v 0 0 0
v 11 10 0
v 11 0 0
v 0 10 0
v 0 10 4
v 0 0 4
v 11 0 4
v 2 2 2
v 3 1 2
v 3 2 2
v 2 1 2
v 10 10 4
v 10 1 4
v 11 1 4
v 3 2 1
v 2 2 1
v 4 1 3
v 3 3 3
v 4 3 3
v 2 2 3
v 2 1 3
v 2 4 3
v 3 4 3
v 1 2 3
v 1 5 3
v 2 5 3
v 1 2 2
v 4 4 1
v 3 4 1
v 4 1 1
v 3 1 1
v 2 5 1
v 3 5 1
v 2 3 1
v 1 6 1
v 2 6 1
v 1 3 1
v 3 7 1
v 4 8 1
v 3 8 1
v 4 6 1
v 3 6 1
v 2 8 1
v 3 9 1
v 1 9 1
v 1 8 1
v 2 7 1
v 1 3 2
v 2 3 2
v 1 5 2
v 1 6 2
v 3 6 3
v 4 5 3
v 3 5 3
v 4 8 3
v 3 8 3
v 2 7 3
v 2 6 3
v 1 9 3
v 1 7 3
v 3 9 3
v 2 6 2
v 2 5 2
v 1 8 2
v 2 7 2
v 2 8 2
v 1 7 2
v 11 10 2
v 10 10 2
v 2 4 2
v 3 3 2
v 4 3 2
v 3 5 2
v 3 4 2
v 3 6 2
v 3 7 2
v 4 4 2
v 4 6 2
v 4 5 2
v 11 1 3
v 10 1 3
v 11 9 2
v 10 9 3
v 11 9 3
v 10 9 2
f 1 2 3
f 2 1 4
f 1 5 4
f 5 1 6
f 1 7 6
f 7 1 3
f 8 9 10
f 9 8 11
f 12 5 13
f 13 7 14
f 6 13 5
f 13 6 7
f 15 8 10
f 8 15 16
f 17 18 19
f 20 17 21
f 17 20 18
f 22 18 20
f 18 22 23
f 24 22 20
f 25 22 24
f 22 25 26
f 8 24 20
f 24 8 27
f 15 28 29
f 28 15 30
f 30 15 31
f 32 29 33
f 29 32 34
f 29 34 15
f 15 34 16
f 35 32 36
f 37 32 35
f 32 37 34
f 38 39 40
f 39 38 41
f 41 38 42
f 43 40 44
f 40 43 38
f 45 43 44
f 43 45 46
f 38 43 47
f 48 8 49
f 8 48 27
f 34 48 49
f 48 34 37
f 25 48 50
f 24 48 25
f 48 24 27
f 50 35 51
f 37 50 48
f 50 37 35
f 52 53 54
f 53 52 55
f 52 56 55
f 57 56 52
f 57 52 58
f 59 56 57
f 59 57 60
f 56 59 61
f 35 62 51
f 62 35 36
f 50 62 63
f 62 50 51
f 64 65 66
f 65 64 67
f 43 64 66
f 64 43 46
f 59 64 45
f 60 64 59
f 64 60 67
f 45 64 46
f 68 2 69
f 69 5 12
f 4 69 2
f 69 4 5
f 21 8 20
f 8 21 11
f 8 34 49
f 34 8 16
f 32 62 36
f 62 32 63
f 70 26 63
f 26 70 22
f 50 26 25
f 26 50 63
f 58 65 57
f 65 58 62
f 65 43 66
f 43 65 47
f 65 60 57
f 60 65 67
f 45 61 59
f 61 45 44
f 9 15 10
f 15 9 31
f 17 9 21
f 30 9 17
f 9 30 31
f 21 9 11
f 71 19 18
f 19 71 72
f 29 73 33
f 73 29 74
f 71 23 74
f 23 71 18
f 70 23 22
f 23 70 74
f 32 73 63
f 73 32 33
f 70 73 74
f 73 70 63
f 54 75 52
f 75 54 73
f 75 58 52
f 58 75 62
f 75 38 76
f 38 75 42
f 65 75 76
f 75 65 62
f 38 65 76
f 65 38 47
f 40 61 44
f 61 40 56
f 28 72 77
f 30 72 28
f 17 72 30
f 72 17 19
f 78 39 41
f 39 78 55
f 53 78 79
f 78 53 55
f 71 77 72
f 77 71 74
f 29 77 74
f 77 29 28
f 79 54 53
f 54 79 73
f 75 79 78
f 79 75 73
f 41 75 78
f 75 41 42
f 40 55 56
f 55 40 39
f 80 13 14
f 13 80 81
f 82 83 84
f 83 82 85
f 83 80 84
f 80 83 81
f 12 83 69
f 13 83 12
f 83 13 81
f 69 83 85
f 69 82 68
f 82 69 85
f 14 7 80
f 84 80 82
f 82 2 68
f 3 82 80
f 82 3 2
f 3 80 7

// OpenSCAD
union() {
    translate([0, 0, 0]) cube([1, 1, 1]);
    translate([0, 0, 1]) cube([1, 1, 1]);
    translate([0, 0, 2]) cube([1, 1, 1]);
    translate([0, 0, 3]) cube([1, 1, 1]);
    translate([0, 1, 0]) cube([1, 1, 1]);
    translate([0, 1, 1]) cube([1, 1, 1]);
    translate([0, 1, 2]) cube([1, 1, 1]);
    translate([0, 1, 3]) cube([1, 1, 1]);
    translate([0, 2, 0]) cube([1, 1, 1]);
    translate([0, 2, 1]) cube([1, 1, 1]);
    translate([0, 2, 2]) cube([1, 1, 1]);
    translate([0, 2, 3]) cube([1, 1, 1]);
    translate([0, 3, 0]) cube([1, 1, 1]);
    translate([0, 3, 1]) cube([1, 1, 1]);
    translate([0, 3, 2]) cube([1, 1, 1]);
    translate([0, 3, 3]) cube([1, 1, 1]);
    translate([0, 4, 0]) cube([1, 1, 1]);
    translate([0, 4, 1]) cube([1, 1, 1]);
    translate([0, 4, 2]) cube([1, 1, 1]);
    translate([0, 4, 3]) cube([1, 1, 1]);
    translate([0, 5, 0]) cube([1, 1, 1]);
    translate([0, 5, 1]) cube([1, 1, 1]);
    translate([0, 5, 2]) cube([1, 1, 1]);
    translate([0, 5, 3]) cube([1, 1, 1]);
    translate([0, 6, 0]) cube([1, 1, 1]);
    translate([0, 6, 1]) cube([1, 1, 1]);
    translate([0, 6, 2]) cube([1, 1, 1]);
    translate([0, 6, 3]) cube([1, 1, 1]);
    translate([0, 7, 0]) cube([1, 1, 1]);
    translate([0, 7, 1]) cube([1, 1, 1]);
    translate([0, 7, 2]) cube([1, 1, 1]);
    translate([0, 7, 3]) cube([1, 1, 1]);
    translate([0, 8, 0]) cube([1, 1, 1]);
    translate([0, 8, 1]) cube([1, 1, 1]);
    translate([0, 8, 2]) cube([1, 1, 1]);
    translate([0, 8, 3]) cube([1, 1, 1]);
    translate([0, 9, 0]) cube([1, 1, 1]);
    translate([0, 9, 1]) cube([1, 1, 1]);
    translate([0, 9, 2]) cube([1, 1, 1]);
    translate([0, 9, 3]) cube([1, 1, 1]);
    translate([1, 0, 0]) cube([1, 1, 1]);
    translate([1, 0, 1]) cube([1, 1, 1]);
    translate([1, 0, 2]) cube([1, 1, 1]);
    translate([1, 0, 3]) cube([1, 1, 1]);
    translate([1, 1, 0]) cube([1, 1, 1]);
    translate([1, 1, 1]) cube([1, 1, 1]);
    translate([1, 1, 2]) cube([1, 1, 1]);
    translate([1, 1, 3]) cube([1, 1, 1]);
    translate([1, 2, 0]) cube([1, 1, 1]);
    translate([1, 2, 1]) cube([1, 1, 1]);
    translate([1, 2, 3]) cube([1, 1, 1]);
    translate([1, 3, 0]) cube([1, 1, 1]);
    translate([1, 3, 3]) cube([1, 1, 1]);
    translate([1, 4, 0]) cube([1, 1, 1]);
    translate([1, 4, 3]) cube([1, 1, 1]);
    translate([1, 5, 0]) cube([1, 1, 1]);
    translate([1, 5, 2]) cube([1, 1, 1]);
    translate([1, 5, 3]) cube([1, 1, 1]);
    translate([1, 6, 0]) cube([1, 1, 1]);
    translate([1, 6, 1]) cube([1, 1, 1]);
    translate([1, 6, 2]) cube([1, 1, 1]);
    translate([1, 6, 3]) cube([1, 1, 1]);
    translate([1, 7, 0]) cube([1, 1, 1]);
    translate([1, 7, 1]) cube([1, 1, 1]);
    translate([1, 7, 3]) cube([1, 1, 1]);
    translate([1, 8, 0]) cube([1, 1, 1]);
    translate([1, 8, 3]) cube([1, 1, 1]);
    translate([1, 9, 0]) cube([1, 1, 1]);
    translate([1, 9, 1]) cube([1, 1, 1]);
    translate([1, 9, 2]) cube([1, 1, 1]);
    translate([1, 9, 3]) cube([1, 1, 1]);
    translate([2, 0, 0]) cube([1, 1, 1]);
    translate([2, 0, 1]) cube([1, 1, 1]);
    translate([2, 0, 2]) cube([1, 1, 1]);
    translate([2, 0, 3]) cube([1, 1, 1]);
    translate([2, 1, 0]) cube([1, 1, 1]);
    translate([2, 1, 1]) cube([1, 1, 1]);
    translate([2, 1, 3]) cube([1, 1, 1]);
    translate([2, 2, 0]) cube([1, 1, 1]);
    translate([2, 2, 3]) cube([1, 1, 1]);
    translate([2, 3, 0]) cube([1, 1, 1]);
    translate([2, 3, 3]) cube([1, 1, 1]);
    translate([2, 4, 0]) cube([1, 1, 1]);
    translate([2, 4, 2]) cube([1, 1, 1]);
    translate([2, 4, 3]) cube([1, 1, 1]);
    translate([2, 5, 0]) cube([1, 1, 1]);
    translate([2, 5, 1]) cube([1, 1, 1]);
    translate([2, 5, 2]) cube([1, 1, 1]);
    translate([2, 5, 3]) cube([1, 1, 1]);
    translate([2, 6, 0]) cube([1, 1, 1]);
    translate([2, 6, 1]) cube([1, 1, 1]);
    translate([2, 6, 3]) cube([1, 1, 1]);
    translate([2, 7, 0]) cube([1, 1, 1]);
    translate([2, 7, 3]) cube([1, 1, 1]);
    translate([2, 8, 0]) cube([1, 1, 1]);
    translate([2, 8, 3]) cube([1, 1, 1]);
    translate([2, 9, 0]) cube([1, 1, 1]);
    translate([2, 9, 1]) cube([1, 1, 1]);
    translate([2, 9, 2]) cube([1, 1, 1]);
    translate([2, 9, 3]) cube([1, 1, 1]);
    translate([3, 0, 0]) cube([1, 1, 1]);
    translate([3, 0, 1]) cube([1, 1, 1]);
    translate([3, 0, 2]) cube([1, 1, 1]);
    translate([3, 0, 3]) cube([1, 1, 1]);
    translate([3, 1, 0]) cube([1, 1, 1]);
    translate([3, 1, 3]) cube([1, 1, 1]);
    translate([3, 2, 0]) cube([1, 1, 1]);
    translate([3, 2, 3]) cube([1, 1, 1]);
    translate([3, 3, 0]) cube([1, 1, 1]);
    translate([3, 3, 2]) cube([1, 1, 1]);
    translate([3, 3, 3]) cube([1, 1, 1]);
    translate([3, 4, 0]) cube([1, 1, 1]);
    translate([3, 4, 1]) cube([1, 1, 1]);
    translate([3, 4, 2]) cube([1, 1, 1]);
    translate([3, 4, 3]) cube([1, 1, 1]);
    translate([3, 5, 0]) cube([1, 1, 1]);
    translate([3, 5, 1]) cube([1, 1, 1]);
    translate([3, 5, 3]) cube([1, 1, 1]);
    translate([3, 6, 0]) cube([1, 1, 1]);
    translate([3, 6, 3]) cube([1, 1, 1]);
    translate([3, 7, 0]) cube([1, 1, 1]);
    translate([3, 7, 3]) cube([1, 1, 1]);
    translate([3, 8, 0]) cube([1, 1, 1]);
    translate([3, 8, 1]) cube([1, 1, 1]);
    translate([3, 8, 2]) cube([1, 1, 1]);
    translate([3, 8, 3]) cube([1, 1, 1]);
    translate([3, 9, 0]) cube([1, 1, 1]);
    translate([3, 9, 1]) cube([1, 1, 1]);
    translate([3, 9, 2]) cube([1, 1, 1]);
    translate([3, 9, 3]) cube([1, 1, 1]);
    translate([4, 0, 0]) cube([1, 1, 1]);
    translate([4, 0, 1]) cube([1, 1, 1]);
    translate([4, 0, 2]) cube([1, 1, 1]);
    translate([4, 0, 3]) cube([1, 1, 1]);
    translate([4, 1, 0]) cube([1, 1, 1]);
    translate([4, 1, 1]) cube([1, 1, 1]);
    translate([4, 1, 2]) cube([1, 1, 1]);
    translate([4, 1, 3]) cube([1, 1, 1]);
    translate([4, 2, 0]) cube([1, 1, 1]);
    translate([4, 2, 1]) cube([1, 1, 1]);
    translate([4, 2, 2]) cube([1, 1, 1]);
    translate([4, 2, 3]) cube([1, 1, 1]);
    translate([4, 3, 0]) cube([1, 1, 1]);
    translate([4, 3, 1]) cube([1, 1, 1]);
    translate([4, 3, 2]) cube([1, 1, 1]);
    translate([4, 3, 3]) cube([1, 1, 1]);
    translate([4, 4, 0]) cube([1, 1, 1]);
    translate([4, 4, 1]) cube([1, 1, 1]);
    translate([4, 4, 2]) cube([1, 1, 1]);
    translate([4, 4, 3]) cube([1, 1, 1]);
    translate([4, 5, 0]) cube([1, 1, 1]);
    translate([4, 5, 1]) cube([1, 1, 1]);
    translate([4, 5, 2]) cube([1, 1, 1]);
    translate([4, 5, 3]) cube([1, 1, 1]);
    translate([4, 6, 0]) cube([1, 1, 1]);
    translate([4, 6, 1]) cube([1, 1, 1]);
    translate([4, 6, 2]) cube([1, 1, 1]);
    translate([4, 6, 3]) cube([1, 1, 1]);
    translate([4, 7, 0]) cube([1, 1, 1]);
    translate([4, 7, 1]) cube([1, 1, 1]);
    translate([4, 7, 2]) cube([1, 1, 1]);
    translate([4, 7, 3]) cube([1, 1, 1]);
    translate([4, 8, 0]) cube([1, 1, 1]);
    translate([4, 8, 1]) cube([1, 1, 1]);
    translate([4, 8, 2]) cube([1, 1, 1]);
    translate([4, 8, 3]) cube([1, 1, 1]);
    translate([4, 9, 0]) cube([1, 1, 1]);
    translate([4, 9, 1]) cube([1, 1, 1]);
    translate([4, 9, 2]) cube([1, 1, 1]);
    translate([4, 9, 3]) cube([1, 1, 1]);
    translate([5, 0, 0]) cube([1, 1, 1]);
    translate([5, 0, 1]) cube([1, 1, 1]);
    translate([5, 0, 2]) cube([1, 1, 1]);
    translate([5, 0, 3]) cube([1, 1, 1]);
    translate([5, 1, 0]) cube([1, 1, 1]);
    translate([5, 1, 1]) cube([1, 1, 1]);
    translate([5, 1, 2]) cube([1, 1, 1]);
    translate([5, 1, 3]) cube([1, 1, 1]);
    translate([5, 2, 0]) cube([1, 1, 1]);
    translate([5, 2, 1]) cube([1, 1, 1]);
    translate([5, 2, 2]) cube([1, 1, 1]);
    translate([5, 2, 3]) cube([1, 1, 1]);
    translate([5, 3, 0]) cube([1, 1, 1]);
    translate([5, 3, 1]) cube([1, 1, 1]);
    translate([5, 3, 2]) cube([1, 1, 1]);
    translate([5, 3, 3]) cube([1, 1, 1]);
    translate([5, 4, 0]) cube([1, 1, 1]);
    translate([5, 4, 1]) cube([1, 1, 1]);
    translate([5, 4, 2]) cube([1, 1, 1]);
    translate([5, 4, 3]) cube([1, 1, 1]);
    translate([5, 5, 0]) cube([1, 1, 1]);
    translate([5, 5, 1]) cube([1, 1, 1]);
    translate([5, 5, 2]) cube([1, 1, 1]);
    translate([5, 5, 3]) cube([1, 1, 1]);
    translate([5, 6, 0]) cube([1, 1, 1]);
    translate([5, 6, 1]) cube([1, 1, 1]);
    translate([5, 6, 2]) cube([1, 1, 1]);
    translate([5, 6, 3]) cube([1, 1, 1]);
    translate([5, 7, 0]) cube([1, 1, 1]);
    translate([5, 7, 1]) cube([1, 1, 1]);
    translate([5, 7, 2]) cube([1, 1, 1]);
    translate([5, 7, 3]) cube([1, 1, 1]);
    translate([5, 8, 0]) cube([1, 1, 1]);
    translate([5, 8, 1]) cube([1, 1, 1]);
    translate([5, 8, 2]) cube([1, 1, 1]);
    translate([5, 8, 3]) cube([1, 1, 1]);
    translate([5, 9, 0]) cube([1, 1, 1]);
    translate([5, 9, 1]) cube([1, 1, 1]);
    translate([5, 9, 2]) cube([1, 1, 1]);
    translate([5, 9, 3]) cube([1, 1, 1]);
    translate([6, 0, 0]) cube([1, 1, 1]);
    translate([6, 0, 1]) cube([1, 1, 1]);
    translate([6, 0, 2]) cube([1, 1, 1]);
    translate([6, 0, 3]) cube([1, 1, 1]);
    translate([6, 1, 0]) cube([1, 1, 1]);
    translate([6, 1, 1]) cube([1, 1, 1]);
    translate([6, 1, 2]) cube([1, 1, 1]);
    translate([6, 1, 3]) cube([1, 1, 1]);
    translate([6, 2, 0]) cube([1, 1, 1]);
    translate([6, 2, 1]) cube([1, 1, 1]);
    translate([6, 2, 2]) cube([1, 1, 1]);
    translate([6, 2, 3]) cube([1, 1, 1]);
    translate([6, 3, 0]) cube([1, 1, 1]);
    translate([6, 3, 1]) cube([1, 1, 1]);
    translate([6, 3, 2]) cube([1, 1, 1]);
    translate([6, 3, 3]) cube([1, 1, 1]);
    translate([6, 4, 0]) cube([1, 1, 1]);
    translate([6, 4, 1]) cube([1, 1, 1]);
    translate([6, 4, 2]) cube([1, 1, 1]);
    translate([6, 4, 3]) cube([1, 1, 1]);
    translate([6, 5, 0]) cube([1, 1, 1]);
    translate([6, 5, 1]) cube([1, 1, 1]);
    translate([6, 5, 2]) cube([1, 1, 1]);
    translate([6, 5, 3]) cube([1, 1, 1]);
    translate([6, 6, 0]) cube([1, 1, 1]);
    translate([6, 6, 1]) cube([1, 1, 1]);
    translate([6, 6, 2]) cube([1, 1, 1]);
    translate([6, 6, 3]) cube([1, 1, 1]);
    translate([6, 7, 0]) cube([1, 1, 1]);
    translate([6, 7, 1]) cube([1, 1, 1]);
    translate([6, 7, 2]) cube([1, 1, 1]);
    translate([6, 7, 3]) cube([1, 1, 1]);
    translate([6, 8, 0]) cube([1, 1, 1]);
    translate([6, 8, 1]) cube([1, 1, 1]);
    translate([6, 8, 2]) cube([1, 1, 1]);
    translate([6, 8, 3]) cube([1, 1, 1]);
    translate([6, 9, 0]) cube([1, 1, 1]);
    translate([6, 9, 1]) cube([1, 1, 1]);
    translate([6, 9, 2]) cube([1, 1, 1]);
    translate([6, 9, 3]) cube([1, 1, 1]);
    translate([7, 0, 0]) cube([1, 1, 1]);
    translate([7, 0, 1]) cube([1, 1, 1]);
    translate([7, 0, 2]) cube([1, 1, 1]);
    translate([7, 0, 3]) cube([1, 1, 1]);
    translate([7, 1, 0]) cube([1, 1, 1]);
    translate([7, 1, 1]) cube([1, 1, 1]);
    translate([7, 1, 2]) cube([1, 1, 1]);
    translate([7, 1, 3]) cube([1, 1, 1]);
    translate([7, 2, 0]) cube([1, 1, 1]);
    translate([7, 2, 1]) cube([1, 1, 1]);
    translate([7, 2, 2]) cube([1, 1, 1]);
    translate([7, 2, 3]) cube([1, 1, 1]);
    translate([7, 3, 0]) cube([1, 1, 1]);
    translate([7, 3, 1]) cube([1, 1, 1]);
    translate([7, 3, 2]) cube([1, 1, 1]);
    translate([7, 3, 3]) cube([1, 1, 1]);
    translate([7, 4, 0]) cube([1, 1, 1]);
    translate([7, 4, 1]) cube([1, 1, 1]);
    translate([7, 4, 2]) cube([1, 1, 1]);
    translate([7, 4, 3]) cube([1, 1, 1]);
    translate([7, 5, 0]) cube([1, 1, 1]);
    translate([7, 5, 1]) cube([1, 1, 1]);
    translate([7, 5, 2]) cube([1, 1, 1]);
    translate([7, 5, 3]) cube([1, 1, 1]);
    translate([7, 6, 0]) cube([1, 1, 1]);
    translate([7, 6, 1]) cube([1, 1, 1]);
    translate([7, 6, 2]) cube([1, 1, 1]);
    translate([7, 6, 3]) cube([1, 1, 1]);
    translate([7, 7, 0]) cube([1, 1, 1]);
    translate([7, 7, 1]) cube([1, 1, 1]);
    translate([7, 7, 2]) cube([1, 1, 1]);
    translate([7, 7, 3]) cube([1, 1, 1]);
    translate([7, 8, 0]) cube([1, 1, 1]);
    translate([7, 8, 1]) cube([1, 1, 1]);
    translate([7, 8, 2]) cube([1, 1, 1]);
    translate([7, 8, 3]) cube([1, 1, 1]);
    translate([7, 9, 0]) cube([1, 1, 1]);
    translate([7, 9, 1]) cube([1, 1, 1]);
    translate([7, 9, 2]) cube([1, 1, 1]);
    translate([7, 9, 3]) cube([1, 1, 1]);
    translate([8, 0, 0]) cube([1, 1, 1]);
    translate([8, 0, 1]) cube([1, 1, 1]);
    translate([8, 0, 2]) cube([1, 1, 1]);
    translate([8, 0, 3]) cube([1, 1, 1]);
    translate([8, 1, 0]) cube([1, 1, 1]);
    translate([8, 1, 1]) cube([1, 1, 1]);
    translate([8, 1, 2]) cube([1, 1, 1]);
    translate([8, 1, 3]) cube([1, 1, 1]);
    translate([8, 2, 0]) cube([1, 1, 1]);
    translate([8, 2, 1]) cube([1, 1, 1]);
    translate([8, 2, 2]) cube([1, 1, 1]);
    translate([8, 2, 3]) cube([1, 1, 1]);
    translate([8, 3, 0]) cube([1, 1, 1]);
    translate([8, 3, 1]) cube([1, 1, 1]);
    translate([8, 3, 2]) cube([1, 1, 1]);
    translate([8, 3, 3]) cube([1, 1, 1]);
    translate([8, 4, 0]) cube([1, 1, 1]);
    translate([8, 4, 1]) cube([1, 1, 1]);
    translate([8, 4, 2]) cube([1, 1, 1]);
    translate([8, 4, 3]) cube([1, 1, 1]);
    translate([8, 5, 0]) cube([1, 1, 1]);
    translate([8, 5, 1]) cube([1, 1, 1]);
    translate([8, 5, 2]) cube([1, 1, 1]);
    translate([8, 5, 3]) cube([1, 1, 1]);
    translate([8, 6, 0]) cube([1, 1, 1]);
    translate([8, 6, 1]) cube([1, 1, 1]);
    translate([8, 6, 2]) cube([1, 1, 1]);
    translate([8, 6, 3]) cube([1, 1, 1]);
    translate([8, 7, 0]) cube([1, 1, 1]);
    translate([8, 7, 1]) cube([1, 1, 1]);
    translate([8, 7, 2]) cube([1, 1, 1]);
    translate([8, 7, 3]) cube([1, 1, 1]);
    translate([8, 8, 0]) cube([1, 1, 1]);
    translate([8, 8, 1]) cube([1, 1, 1]);
    translate([8, 8, 2]) cube([1, 1, 1]);
    translate([8, 8, 3]) cube([1, 1, 1]);
    translate([8, 9, 0]) cube([1, 1, 1]);
    translate([8, 9, 1]) cube([1, 1, 1]);
    translate([8, 9, 2]) cube([1, 1, 1]);
    translate([8, 9, 3]) cube([1, 1, 1]);
    translate([9, 0, 0]) cube([1, 1, 1]);
    translate([9, 0, 1]) cube([1, 1, 1]);
    translate([9, 0, 2]) cube([1, 1, 1]);
    translate([9, 0, 3]) cube([1, 1, 1]);
    translate([9, 1, 0]) cube([1, 1, 1]);
    translate([9, 1, 1]) cube([1, 1, 1]);
    translate([9, 1, 2]) cube([1, 1, 1]);
    translate([9, 1, 3]) cube([1, 1, 1]);
    translate([9, 2, 0]) cube([1, 1, 1]);
    translate([9, 2, 1]) cube([1, 1, 1]);
    translate([9, 2, 2]) cube([1, 1, 1]);
    translate([9, 2, 3]) cube([1, 1, 1]);
    translate([9, 3, 0]) cube([1, 1, 1]);
    translate([9, 3, 1]) cube([1, 1, 1]);
    translate([9, 3, 2]) cube([1, 1, 1]);
    translate([9, 3, 3]) cube([1, 1, 1]);
    translate([9, 4, 0]) cube([1, 1, 1]);
    translate([9, 4, 1]) cube([1, 1, 1]);
    translate([9, 4, 2]) cube([1, 1, 1]);
    translate([9, 4, 3]) cube([1, 1, 1]);
    translate([9, 5, 0]) cube([1, 1, 1]);
    translate([9, 5, 1]) cube([1, 1, 1]);
    translate([9, 5, 2]) cube([1, 1, 1]);
    translate([9, 5, 3]) cube([1, 1, 1]);
    translate([9, 6, 0]) cube([1, 1, 1]);
    translate([9, 6, 1]) cube([1, 1, 1]);
    translate([9, 6, 2]) cube([1, 1, 1]);
    translate([9, 6, 3]) cube([1, 1, 1]);
    translate([9, 7, 0]) cube([1, 1, 1]);
    translate([9, 7, 1]) cube([1, 1, 1]);
    translate([9, 7, 2]) cube([1, 1, 1]);
    translate([9, 7, 3]) cube([1, 1, 1]);
    translate([9, 8, 0]) cube([1, 1, 1]);
    translate([9, 8, 1]) cube([1, 1, 1]);
    translate([9, 8, 2]) cube([1, 1, 1]);
    translate([9, 8, 3]) cube([1, 1, 1]);
    translate([9, 9, 0]) cube([1, 1, 1]);
    translate([9, 9, 1]) cube([1, 1, 1]);
    translate([9, 9, 2]) cube([1, 1, 1]);
    translate([9, 9, 3]) cube([1, 1, 1]);
    translate([10, 0, 0]) cube([1, 1, 1]);
    translate([10, 0, 1]) cube([1, 1, 1]);
    translate([10, 0, 2]) cube([1, 1, 1]);
    translate([10, 1, 0]) cube([1, 1, 1]);
    translate([10, 1, 1]) cube([1, 1, 1]);
    translate([10, 1, 2]) cube([1, 1, 1]);
    translate([10, 2, 0]) cube([1, 1, 1]);
    translate([10, 2, 1]) cube([1, 1, 1]);
    translate([10, 2, 2]) cube([1, 1, 1]);
    translate([10, 3, 0]) cube([1, 1, 1]);
    translate([10, 3, 1]) cube([1, 1, 1]);
    translate([10, 3, 2]) cube([1, 1, 1]);
    translate([10, 4, 0]) cube([1, 1, 1]);
    translate([10, 4, 1]) cube([1, 1, 1]);
    translate([10, 4, 2]) cube([1, 1, 1]);
    translate([10, 5, 0]) cube([1, 1, 1]);
    translate([10, 5, 1]) cube([1, 1, 1]);
    translate([10, 5, 2]) cube([1, 1, 1]);
    translate([10, 6, 0]) cube([1, 1, 1]);
    translate([10, 6, 1]) cube([1, 1, 1]);
    translate([10, 6, 2]) cube([1, 1, 1]);
    translate([10, 7, 0]) cube([1, 1, 1]);
    translate([10, 7, 1]) cube([1, 1, 1]);
    translate([10, 7, 2]) cube([1, 1, 1]);
    translate([10, 8, 0]) cube([1, 1, 1]);
    translate([10, 8, 1]) cube([1, 1, 1]);
    translate([10, 8, 2]) cube([1, 1, 1]);
    translate([10, 9, 0]) cube([1, 1, 1]);
    translate([10, 9, 1]) cube([1, 1, 1]);
    translate([10, 0, 3]) cube([1, 1, 1]);
}
